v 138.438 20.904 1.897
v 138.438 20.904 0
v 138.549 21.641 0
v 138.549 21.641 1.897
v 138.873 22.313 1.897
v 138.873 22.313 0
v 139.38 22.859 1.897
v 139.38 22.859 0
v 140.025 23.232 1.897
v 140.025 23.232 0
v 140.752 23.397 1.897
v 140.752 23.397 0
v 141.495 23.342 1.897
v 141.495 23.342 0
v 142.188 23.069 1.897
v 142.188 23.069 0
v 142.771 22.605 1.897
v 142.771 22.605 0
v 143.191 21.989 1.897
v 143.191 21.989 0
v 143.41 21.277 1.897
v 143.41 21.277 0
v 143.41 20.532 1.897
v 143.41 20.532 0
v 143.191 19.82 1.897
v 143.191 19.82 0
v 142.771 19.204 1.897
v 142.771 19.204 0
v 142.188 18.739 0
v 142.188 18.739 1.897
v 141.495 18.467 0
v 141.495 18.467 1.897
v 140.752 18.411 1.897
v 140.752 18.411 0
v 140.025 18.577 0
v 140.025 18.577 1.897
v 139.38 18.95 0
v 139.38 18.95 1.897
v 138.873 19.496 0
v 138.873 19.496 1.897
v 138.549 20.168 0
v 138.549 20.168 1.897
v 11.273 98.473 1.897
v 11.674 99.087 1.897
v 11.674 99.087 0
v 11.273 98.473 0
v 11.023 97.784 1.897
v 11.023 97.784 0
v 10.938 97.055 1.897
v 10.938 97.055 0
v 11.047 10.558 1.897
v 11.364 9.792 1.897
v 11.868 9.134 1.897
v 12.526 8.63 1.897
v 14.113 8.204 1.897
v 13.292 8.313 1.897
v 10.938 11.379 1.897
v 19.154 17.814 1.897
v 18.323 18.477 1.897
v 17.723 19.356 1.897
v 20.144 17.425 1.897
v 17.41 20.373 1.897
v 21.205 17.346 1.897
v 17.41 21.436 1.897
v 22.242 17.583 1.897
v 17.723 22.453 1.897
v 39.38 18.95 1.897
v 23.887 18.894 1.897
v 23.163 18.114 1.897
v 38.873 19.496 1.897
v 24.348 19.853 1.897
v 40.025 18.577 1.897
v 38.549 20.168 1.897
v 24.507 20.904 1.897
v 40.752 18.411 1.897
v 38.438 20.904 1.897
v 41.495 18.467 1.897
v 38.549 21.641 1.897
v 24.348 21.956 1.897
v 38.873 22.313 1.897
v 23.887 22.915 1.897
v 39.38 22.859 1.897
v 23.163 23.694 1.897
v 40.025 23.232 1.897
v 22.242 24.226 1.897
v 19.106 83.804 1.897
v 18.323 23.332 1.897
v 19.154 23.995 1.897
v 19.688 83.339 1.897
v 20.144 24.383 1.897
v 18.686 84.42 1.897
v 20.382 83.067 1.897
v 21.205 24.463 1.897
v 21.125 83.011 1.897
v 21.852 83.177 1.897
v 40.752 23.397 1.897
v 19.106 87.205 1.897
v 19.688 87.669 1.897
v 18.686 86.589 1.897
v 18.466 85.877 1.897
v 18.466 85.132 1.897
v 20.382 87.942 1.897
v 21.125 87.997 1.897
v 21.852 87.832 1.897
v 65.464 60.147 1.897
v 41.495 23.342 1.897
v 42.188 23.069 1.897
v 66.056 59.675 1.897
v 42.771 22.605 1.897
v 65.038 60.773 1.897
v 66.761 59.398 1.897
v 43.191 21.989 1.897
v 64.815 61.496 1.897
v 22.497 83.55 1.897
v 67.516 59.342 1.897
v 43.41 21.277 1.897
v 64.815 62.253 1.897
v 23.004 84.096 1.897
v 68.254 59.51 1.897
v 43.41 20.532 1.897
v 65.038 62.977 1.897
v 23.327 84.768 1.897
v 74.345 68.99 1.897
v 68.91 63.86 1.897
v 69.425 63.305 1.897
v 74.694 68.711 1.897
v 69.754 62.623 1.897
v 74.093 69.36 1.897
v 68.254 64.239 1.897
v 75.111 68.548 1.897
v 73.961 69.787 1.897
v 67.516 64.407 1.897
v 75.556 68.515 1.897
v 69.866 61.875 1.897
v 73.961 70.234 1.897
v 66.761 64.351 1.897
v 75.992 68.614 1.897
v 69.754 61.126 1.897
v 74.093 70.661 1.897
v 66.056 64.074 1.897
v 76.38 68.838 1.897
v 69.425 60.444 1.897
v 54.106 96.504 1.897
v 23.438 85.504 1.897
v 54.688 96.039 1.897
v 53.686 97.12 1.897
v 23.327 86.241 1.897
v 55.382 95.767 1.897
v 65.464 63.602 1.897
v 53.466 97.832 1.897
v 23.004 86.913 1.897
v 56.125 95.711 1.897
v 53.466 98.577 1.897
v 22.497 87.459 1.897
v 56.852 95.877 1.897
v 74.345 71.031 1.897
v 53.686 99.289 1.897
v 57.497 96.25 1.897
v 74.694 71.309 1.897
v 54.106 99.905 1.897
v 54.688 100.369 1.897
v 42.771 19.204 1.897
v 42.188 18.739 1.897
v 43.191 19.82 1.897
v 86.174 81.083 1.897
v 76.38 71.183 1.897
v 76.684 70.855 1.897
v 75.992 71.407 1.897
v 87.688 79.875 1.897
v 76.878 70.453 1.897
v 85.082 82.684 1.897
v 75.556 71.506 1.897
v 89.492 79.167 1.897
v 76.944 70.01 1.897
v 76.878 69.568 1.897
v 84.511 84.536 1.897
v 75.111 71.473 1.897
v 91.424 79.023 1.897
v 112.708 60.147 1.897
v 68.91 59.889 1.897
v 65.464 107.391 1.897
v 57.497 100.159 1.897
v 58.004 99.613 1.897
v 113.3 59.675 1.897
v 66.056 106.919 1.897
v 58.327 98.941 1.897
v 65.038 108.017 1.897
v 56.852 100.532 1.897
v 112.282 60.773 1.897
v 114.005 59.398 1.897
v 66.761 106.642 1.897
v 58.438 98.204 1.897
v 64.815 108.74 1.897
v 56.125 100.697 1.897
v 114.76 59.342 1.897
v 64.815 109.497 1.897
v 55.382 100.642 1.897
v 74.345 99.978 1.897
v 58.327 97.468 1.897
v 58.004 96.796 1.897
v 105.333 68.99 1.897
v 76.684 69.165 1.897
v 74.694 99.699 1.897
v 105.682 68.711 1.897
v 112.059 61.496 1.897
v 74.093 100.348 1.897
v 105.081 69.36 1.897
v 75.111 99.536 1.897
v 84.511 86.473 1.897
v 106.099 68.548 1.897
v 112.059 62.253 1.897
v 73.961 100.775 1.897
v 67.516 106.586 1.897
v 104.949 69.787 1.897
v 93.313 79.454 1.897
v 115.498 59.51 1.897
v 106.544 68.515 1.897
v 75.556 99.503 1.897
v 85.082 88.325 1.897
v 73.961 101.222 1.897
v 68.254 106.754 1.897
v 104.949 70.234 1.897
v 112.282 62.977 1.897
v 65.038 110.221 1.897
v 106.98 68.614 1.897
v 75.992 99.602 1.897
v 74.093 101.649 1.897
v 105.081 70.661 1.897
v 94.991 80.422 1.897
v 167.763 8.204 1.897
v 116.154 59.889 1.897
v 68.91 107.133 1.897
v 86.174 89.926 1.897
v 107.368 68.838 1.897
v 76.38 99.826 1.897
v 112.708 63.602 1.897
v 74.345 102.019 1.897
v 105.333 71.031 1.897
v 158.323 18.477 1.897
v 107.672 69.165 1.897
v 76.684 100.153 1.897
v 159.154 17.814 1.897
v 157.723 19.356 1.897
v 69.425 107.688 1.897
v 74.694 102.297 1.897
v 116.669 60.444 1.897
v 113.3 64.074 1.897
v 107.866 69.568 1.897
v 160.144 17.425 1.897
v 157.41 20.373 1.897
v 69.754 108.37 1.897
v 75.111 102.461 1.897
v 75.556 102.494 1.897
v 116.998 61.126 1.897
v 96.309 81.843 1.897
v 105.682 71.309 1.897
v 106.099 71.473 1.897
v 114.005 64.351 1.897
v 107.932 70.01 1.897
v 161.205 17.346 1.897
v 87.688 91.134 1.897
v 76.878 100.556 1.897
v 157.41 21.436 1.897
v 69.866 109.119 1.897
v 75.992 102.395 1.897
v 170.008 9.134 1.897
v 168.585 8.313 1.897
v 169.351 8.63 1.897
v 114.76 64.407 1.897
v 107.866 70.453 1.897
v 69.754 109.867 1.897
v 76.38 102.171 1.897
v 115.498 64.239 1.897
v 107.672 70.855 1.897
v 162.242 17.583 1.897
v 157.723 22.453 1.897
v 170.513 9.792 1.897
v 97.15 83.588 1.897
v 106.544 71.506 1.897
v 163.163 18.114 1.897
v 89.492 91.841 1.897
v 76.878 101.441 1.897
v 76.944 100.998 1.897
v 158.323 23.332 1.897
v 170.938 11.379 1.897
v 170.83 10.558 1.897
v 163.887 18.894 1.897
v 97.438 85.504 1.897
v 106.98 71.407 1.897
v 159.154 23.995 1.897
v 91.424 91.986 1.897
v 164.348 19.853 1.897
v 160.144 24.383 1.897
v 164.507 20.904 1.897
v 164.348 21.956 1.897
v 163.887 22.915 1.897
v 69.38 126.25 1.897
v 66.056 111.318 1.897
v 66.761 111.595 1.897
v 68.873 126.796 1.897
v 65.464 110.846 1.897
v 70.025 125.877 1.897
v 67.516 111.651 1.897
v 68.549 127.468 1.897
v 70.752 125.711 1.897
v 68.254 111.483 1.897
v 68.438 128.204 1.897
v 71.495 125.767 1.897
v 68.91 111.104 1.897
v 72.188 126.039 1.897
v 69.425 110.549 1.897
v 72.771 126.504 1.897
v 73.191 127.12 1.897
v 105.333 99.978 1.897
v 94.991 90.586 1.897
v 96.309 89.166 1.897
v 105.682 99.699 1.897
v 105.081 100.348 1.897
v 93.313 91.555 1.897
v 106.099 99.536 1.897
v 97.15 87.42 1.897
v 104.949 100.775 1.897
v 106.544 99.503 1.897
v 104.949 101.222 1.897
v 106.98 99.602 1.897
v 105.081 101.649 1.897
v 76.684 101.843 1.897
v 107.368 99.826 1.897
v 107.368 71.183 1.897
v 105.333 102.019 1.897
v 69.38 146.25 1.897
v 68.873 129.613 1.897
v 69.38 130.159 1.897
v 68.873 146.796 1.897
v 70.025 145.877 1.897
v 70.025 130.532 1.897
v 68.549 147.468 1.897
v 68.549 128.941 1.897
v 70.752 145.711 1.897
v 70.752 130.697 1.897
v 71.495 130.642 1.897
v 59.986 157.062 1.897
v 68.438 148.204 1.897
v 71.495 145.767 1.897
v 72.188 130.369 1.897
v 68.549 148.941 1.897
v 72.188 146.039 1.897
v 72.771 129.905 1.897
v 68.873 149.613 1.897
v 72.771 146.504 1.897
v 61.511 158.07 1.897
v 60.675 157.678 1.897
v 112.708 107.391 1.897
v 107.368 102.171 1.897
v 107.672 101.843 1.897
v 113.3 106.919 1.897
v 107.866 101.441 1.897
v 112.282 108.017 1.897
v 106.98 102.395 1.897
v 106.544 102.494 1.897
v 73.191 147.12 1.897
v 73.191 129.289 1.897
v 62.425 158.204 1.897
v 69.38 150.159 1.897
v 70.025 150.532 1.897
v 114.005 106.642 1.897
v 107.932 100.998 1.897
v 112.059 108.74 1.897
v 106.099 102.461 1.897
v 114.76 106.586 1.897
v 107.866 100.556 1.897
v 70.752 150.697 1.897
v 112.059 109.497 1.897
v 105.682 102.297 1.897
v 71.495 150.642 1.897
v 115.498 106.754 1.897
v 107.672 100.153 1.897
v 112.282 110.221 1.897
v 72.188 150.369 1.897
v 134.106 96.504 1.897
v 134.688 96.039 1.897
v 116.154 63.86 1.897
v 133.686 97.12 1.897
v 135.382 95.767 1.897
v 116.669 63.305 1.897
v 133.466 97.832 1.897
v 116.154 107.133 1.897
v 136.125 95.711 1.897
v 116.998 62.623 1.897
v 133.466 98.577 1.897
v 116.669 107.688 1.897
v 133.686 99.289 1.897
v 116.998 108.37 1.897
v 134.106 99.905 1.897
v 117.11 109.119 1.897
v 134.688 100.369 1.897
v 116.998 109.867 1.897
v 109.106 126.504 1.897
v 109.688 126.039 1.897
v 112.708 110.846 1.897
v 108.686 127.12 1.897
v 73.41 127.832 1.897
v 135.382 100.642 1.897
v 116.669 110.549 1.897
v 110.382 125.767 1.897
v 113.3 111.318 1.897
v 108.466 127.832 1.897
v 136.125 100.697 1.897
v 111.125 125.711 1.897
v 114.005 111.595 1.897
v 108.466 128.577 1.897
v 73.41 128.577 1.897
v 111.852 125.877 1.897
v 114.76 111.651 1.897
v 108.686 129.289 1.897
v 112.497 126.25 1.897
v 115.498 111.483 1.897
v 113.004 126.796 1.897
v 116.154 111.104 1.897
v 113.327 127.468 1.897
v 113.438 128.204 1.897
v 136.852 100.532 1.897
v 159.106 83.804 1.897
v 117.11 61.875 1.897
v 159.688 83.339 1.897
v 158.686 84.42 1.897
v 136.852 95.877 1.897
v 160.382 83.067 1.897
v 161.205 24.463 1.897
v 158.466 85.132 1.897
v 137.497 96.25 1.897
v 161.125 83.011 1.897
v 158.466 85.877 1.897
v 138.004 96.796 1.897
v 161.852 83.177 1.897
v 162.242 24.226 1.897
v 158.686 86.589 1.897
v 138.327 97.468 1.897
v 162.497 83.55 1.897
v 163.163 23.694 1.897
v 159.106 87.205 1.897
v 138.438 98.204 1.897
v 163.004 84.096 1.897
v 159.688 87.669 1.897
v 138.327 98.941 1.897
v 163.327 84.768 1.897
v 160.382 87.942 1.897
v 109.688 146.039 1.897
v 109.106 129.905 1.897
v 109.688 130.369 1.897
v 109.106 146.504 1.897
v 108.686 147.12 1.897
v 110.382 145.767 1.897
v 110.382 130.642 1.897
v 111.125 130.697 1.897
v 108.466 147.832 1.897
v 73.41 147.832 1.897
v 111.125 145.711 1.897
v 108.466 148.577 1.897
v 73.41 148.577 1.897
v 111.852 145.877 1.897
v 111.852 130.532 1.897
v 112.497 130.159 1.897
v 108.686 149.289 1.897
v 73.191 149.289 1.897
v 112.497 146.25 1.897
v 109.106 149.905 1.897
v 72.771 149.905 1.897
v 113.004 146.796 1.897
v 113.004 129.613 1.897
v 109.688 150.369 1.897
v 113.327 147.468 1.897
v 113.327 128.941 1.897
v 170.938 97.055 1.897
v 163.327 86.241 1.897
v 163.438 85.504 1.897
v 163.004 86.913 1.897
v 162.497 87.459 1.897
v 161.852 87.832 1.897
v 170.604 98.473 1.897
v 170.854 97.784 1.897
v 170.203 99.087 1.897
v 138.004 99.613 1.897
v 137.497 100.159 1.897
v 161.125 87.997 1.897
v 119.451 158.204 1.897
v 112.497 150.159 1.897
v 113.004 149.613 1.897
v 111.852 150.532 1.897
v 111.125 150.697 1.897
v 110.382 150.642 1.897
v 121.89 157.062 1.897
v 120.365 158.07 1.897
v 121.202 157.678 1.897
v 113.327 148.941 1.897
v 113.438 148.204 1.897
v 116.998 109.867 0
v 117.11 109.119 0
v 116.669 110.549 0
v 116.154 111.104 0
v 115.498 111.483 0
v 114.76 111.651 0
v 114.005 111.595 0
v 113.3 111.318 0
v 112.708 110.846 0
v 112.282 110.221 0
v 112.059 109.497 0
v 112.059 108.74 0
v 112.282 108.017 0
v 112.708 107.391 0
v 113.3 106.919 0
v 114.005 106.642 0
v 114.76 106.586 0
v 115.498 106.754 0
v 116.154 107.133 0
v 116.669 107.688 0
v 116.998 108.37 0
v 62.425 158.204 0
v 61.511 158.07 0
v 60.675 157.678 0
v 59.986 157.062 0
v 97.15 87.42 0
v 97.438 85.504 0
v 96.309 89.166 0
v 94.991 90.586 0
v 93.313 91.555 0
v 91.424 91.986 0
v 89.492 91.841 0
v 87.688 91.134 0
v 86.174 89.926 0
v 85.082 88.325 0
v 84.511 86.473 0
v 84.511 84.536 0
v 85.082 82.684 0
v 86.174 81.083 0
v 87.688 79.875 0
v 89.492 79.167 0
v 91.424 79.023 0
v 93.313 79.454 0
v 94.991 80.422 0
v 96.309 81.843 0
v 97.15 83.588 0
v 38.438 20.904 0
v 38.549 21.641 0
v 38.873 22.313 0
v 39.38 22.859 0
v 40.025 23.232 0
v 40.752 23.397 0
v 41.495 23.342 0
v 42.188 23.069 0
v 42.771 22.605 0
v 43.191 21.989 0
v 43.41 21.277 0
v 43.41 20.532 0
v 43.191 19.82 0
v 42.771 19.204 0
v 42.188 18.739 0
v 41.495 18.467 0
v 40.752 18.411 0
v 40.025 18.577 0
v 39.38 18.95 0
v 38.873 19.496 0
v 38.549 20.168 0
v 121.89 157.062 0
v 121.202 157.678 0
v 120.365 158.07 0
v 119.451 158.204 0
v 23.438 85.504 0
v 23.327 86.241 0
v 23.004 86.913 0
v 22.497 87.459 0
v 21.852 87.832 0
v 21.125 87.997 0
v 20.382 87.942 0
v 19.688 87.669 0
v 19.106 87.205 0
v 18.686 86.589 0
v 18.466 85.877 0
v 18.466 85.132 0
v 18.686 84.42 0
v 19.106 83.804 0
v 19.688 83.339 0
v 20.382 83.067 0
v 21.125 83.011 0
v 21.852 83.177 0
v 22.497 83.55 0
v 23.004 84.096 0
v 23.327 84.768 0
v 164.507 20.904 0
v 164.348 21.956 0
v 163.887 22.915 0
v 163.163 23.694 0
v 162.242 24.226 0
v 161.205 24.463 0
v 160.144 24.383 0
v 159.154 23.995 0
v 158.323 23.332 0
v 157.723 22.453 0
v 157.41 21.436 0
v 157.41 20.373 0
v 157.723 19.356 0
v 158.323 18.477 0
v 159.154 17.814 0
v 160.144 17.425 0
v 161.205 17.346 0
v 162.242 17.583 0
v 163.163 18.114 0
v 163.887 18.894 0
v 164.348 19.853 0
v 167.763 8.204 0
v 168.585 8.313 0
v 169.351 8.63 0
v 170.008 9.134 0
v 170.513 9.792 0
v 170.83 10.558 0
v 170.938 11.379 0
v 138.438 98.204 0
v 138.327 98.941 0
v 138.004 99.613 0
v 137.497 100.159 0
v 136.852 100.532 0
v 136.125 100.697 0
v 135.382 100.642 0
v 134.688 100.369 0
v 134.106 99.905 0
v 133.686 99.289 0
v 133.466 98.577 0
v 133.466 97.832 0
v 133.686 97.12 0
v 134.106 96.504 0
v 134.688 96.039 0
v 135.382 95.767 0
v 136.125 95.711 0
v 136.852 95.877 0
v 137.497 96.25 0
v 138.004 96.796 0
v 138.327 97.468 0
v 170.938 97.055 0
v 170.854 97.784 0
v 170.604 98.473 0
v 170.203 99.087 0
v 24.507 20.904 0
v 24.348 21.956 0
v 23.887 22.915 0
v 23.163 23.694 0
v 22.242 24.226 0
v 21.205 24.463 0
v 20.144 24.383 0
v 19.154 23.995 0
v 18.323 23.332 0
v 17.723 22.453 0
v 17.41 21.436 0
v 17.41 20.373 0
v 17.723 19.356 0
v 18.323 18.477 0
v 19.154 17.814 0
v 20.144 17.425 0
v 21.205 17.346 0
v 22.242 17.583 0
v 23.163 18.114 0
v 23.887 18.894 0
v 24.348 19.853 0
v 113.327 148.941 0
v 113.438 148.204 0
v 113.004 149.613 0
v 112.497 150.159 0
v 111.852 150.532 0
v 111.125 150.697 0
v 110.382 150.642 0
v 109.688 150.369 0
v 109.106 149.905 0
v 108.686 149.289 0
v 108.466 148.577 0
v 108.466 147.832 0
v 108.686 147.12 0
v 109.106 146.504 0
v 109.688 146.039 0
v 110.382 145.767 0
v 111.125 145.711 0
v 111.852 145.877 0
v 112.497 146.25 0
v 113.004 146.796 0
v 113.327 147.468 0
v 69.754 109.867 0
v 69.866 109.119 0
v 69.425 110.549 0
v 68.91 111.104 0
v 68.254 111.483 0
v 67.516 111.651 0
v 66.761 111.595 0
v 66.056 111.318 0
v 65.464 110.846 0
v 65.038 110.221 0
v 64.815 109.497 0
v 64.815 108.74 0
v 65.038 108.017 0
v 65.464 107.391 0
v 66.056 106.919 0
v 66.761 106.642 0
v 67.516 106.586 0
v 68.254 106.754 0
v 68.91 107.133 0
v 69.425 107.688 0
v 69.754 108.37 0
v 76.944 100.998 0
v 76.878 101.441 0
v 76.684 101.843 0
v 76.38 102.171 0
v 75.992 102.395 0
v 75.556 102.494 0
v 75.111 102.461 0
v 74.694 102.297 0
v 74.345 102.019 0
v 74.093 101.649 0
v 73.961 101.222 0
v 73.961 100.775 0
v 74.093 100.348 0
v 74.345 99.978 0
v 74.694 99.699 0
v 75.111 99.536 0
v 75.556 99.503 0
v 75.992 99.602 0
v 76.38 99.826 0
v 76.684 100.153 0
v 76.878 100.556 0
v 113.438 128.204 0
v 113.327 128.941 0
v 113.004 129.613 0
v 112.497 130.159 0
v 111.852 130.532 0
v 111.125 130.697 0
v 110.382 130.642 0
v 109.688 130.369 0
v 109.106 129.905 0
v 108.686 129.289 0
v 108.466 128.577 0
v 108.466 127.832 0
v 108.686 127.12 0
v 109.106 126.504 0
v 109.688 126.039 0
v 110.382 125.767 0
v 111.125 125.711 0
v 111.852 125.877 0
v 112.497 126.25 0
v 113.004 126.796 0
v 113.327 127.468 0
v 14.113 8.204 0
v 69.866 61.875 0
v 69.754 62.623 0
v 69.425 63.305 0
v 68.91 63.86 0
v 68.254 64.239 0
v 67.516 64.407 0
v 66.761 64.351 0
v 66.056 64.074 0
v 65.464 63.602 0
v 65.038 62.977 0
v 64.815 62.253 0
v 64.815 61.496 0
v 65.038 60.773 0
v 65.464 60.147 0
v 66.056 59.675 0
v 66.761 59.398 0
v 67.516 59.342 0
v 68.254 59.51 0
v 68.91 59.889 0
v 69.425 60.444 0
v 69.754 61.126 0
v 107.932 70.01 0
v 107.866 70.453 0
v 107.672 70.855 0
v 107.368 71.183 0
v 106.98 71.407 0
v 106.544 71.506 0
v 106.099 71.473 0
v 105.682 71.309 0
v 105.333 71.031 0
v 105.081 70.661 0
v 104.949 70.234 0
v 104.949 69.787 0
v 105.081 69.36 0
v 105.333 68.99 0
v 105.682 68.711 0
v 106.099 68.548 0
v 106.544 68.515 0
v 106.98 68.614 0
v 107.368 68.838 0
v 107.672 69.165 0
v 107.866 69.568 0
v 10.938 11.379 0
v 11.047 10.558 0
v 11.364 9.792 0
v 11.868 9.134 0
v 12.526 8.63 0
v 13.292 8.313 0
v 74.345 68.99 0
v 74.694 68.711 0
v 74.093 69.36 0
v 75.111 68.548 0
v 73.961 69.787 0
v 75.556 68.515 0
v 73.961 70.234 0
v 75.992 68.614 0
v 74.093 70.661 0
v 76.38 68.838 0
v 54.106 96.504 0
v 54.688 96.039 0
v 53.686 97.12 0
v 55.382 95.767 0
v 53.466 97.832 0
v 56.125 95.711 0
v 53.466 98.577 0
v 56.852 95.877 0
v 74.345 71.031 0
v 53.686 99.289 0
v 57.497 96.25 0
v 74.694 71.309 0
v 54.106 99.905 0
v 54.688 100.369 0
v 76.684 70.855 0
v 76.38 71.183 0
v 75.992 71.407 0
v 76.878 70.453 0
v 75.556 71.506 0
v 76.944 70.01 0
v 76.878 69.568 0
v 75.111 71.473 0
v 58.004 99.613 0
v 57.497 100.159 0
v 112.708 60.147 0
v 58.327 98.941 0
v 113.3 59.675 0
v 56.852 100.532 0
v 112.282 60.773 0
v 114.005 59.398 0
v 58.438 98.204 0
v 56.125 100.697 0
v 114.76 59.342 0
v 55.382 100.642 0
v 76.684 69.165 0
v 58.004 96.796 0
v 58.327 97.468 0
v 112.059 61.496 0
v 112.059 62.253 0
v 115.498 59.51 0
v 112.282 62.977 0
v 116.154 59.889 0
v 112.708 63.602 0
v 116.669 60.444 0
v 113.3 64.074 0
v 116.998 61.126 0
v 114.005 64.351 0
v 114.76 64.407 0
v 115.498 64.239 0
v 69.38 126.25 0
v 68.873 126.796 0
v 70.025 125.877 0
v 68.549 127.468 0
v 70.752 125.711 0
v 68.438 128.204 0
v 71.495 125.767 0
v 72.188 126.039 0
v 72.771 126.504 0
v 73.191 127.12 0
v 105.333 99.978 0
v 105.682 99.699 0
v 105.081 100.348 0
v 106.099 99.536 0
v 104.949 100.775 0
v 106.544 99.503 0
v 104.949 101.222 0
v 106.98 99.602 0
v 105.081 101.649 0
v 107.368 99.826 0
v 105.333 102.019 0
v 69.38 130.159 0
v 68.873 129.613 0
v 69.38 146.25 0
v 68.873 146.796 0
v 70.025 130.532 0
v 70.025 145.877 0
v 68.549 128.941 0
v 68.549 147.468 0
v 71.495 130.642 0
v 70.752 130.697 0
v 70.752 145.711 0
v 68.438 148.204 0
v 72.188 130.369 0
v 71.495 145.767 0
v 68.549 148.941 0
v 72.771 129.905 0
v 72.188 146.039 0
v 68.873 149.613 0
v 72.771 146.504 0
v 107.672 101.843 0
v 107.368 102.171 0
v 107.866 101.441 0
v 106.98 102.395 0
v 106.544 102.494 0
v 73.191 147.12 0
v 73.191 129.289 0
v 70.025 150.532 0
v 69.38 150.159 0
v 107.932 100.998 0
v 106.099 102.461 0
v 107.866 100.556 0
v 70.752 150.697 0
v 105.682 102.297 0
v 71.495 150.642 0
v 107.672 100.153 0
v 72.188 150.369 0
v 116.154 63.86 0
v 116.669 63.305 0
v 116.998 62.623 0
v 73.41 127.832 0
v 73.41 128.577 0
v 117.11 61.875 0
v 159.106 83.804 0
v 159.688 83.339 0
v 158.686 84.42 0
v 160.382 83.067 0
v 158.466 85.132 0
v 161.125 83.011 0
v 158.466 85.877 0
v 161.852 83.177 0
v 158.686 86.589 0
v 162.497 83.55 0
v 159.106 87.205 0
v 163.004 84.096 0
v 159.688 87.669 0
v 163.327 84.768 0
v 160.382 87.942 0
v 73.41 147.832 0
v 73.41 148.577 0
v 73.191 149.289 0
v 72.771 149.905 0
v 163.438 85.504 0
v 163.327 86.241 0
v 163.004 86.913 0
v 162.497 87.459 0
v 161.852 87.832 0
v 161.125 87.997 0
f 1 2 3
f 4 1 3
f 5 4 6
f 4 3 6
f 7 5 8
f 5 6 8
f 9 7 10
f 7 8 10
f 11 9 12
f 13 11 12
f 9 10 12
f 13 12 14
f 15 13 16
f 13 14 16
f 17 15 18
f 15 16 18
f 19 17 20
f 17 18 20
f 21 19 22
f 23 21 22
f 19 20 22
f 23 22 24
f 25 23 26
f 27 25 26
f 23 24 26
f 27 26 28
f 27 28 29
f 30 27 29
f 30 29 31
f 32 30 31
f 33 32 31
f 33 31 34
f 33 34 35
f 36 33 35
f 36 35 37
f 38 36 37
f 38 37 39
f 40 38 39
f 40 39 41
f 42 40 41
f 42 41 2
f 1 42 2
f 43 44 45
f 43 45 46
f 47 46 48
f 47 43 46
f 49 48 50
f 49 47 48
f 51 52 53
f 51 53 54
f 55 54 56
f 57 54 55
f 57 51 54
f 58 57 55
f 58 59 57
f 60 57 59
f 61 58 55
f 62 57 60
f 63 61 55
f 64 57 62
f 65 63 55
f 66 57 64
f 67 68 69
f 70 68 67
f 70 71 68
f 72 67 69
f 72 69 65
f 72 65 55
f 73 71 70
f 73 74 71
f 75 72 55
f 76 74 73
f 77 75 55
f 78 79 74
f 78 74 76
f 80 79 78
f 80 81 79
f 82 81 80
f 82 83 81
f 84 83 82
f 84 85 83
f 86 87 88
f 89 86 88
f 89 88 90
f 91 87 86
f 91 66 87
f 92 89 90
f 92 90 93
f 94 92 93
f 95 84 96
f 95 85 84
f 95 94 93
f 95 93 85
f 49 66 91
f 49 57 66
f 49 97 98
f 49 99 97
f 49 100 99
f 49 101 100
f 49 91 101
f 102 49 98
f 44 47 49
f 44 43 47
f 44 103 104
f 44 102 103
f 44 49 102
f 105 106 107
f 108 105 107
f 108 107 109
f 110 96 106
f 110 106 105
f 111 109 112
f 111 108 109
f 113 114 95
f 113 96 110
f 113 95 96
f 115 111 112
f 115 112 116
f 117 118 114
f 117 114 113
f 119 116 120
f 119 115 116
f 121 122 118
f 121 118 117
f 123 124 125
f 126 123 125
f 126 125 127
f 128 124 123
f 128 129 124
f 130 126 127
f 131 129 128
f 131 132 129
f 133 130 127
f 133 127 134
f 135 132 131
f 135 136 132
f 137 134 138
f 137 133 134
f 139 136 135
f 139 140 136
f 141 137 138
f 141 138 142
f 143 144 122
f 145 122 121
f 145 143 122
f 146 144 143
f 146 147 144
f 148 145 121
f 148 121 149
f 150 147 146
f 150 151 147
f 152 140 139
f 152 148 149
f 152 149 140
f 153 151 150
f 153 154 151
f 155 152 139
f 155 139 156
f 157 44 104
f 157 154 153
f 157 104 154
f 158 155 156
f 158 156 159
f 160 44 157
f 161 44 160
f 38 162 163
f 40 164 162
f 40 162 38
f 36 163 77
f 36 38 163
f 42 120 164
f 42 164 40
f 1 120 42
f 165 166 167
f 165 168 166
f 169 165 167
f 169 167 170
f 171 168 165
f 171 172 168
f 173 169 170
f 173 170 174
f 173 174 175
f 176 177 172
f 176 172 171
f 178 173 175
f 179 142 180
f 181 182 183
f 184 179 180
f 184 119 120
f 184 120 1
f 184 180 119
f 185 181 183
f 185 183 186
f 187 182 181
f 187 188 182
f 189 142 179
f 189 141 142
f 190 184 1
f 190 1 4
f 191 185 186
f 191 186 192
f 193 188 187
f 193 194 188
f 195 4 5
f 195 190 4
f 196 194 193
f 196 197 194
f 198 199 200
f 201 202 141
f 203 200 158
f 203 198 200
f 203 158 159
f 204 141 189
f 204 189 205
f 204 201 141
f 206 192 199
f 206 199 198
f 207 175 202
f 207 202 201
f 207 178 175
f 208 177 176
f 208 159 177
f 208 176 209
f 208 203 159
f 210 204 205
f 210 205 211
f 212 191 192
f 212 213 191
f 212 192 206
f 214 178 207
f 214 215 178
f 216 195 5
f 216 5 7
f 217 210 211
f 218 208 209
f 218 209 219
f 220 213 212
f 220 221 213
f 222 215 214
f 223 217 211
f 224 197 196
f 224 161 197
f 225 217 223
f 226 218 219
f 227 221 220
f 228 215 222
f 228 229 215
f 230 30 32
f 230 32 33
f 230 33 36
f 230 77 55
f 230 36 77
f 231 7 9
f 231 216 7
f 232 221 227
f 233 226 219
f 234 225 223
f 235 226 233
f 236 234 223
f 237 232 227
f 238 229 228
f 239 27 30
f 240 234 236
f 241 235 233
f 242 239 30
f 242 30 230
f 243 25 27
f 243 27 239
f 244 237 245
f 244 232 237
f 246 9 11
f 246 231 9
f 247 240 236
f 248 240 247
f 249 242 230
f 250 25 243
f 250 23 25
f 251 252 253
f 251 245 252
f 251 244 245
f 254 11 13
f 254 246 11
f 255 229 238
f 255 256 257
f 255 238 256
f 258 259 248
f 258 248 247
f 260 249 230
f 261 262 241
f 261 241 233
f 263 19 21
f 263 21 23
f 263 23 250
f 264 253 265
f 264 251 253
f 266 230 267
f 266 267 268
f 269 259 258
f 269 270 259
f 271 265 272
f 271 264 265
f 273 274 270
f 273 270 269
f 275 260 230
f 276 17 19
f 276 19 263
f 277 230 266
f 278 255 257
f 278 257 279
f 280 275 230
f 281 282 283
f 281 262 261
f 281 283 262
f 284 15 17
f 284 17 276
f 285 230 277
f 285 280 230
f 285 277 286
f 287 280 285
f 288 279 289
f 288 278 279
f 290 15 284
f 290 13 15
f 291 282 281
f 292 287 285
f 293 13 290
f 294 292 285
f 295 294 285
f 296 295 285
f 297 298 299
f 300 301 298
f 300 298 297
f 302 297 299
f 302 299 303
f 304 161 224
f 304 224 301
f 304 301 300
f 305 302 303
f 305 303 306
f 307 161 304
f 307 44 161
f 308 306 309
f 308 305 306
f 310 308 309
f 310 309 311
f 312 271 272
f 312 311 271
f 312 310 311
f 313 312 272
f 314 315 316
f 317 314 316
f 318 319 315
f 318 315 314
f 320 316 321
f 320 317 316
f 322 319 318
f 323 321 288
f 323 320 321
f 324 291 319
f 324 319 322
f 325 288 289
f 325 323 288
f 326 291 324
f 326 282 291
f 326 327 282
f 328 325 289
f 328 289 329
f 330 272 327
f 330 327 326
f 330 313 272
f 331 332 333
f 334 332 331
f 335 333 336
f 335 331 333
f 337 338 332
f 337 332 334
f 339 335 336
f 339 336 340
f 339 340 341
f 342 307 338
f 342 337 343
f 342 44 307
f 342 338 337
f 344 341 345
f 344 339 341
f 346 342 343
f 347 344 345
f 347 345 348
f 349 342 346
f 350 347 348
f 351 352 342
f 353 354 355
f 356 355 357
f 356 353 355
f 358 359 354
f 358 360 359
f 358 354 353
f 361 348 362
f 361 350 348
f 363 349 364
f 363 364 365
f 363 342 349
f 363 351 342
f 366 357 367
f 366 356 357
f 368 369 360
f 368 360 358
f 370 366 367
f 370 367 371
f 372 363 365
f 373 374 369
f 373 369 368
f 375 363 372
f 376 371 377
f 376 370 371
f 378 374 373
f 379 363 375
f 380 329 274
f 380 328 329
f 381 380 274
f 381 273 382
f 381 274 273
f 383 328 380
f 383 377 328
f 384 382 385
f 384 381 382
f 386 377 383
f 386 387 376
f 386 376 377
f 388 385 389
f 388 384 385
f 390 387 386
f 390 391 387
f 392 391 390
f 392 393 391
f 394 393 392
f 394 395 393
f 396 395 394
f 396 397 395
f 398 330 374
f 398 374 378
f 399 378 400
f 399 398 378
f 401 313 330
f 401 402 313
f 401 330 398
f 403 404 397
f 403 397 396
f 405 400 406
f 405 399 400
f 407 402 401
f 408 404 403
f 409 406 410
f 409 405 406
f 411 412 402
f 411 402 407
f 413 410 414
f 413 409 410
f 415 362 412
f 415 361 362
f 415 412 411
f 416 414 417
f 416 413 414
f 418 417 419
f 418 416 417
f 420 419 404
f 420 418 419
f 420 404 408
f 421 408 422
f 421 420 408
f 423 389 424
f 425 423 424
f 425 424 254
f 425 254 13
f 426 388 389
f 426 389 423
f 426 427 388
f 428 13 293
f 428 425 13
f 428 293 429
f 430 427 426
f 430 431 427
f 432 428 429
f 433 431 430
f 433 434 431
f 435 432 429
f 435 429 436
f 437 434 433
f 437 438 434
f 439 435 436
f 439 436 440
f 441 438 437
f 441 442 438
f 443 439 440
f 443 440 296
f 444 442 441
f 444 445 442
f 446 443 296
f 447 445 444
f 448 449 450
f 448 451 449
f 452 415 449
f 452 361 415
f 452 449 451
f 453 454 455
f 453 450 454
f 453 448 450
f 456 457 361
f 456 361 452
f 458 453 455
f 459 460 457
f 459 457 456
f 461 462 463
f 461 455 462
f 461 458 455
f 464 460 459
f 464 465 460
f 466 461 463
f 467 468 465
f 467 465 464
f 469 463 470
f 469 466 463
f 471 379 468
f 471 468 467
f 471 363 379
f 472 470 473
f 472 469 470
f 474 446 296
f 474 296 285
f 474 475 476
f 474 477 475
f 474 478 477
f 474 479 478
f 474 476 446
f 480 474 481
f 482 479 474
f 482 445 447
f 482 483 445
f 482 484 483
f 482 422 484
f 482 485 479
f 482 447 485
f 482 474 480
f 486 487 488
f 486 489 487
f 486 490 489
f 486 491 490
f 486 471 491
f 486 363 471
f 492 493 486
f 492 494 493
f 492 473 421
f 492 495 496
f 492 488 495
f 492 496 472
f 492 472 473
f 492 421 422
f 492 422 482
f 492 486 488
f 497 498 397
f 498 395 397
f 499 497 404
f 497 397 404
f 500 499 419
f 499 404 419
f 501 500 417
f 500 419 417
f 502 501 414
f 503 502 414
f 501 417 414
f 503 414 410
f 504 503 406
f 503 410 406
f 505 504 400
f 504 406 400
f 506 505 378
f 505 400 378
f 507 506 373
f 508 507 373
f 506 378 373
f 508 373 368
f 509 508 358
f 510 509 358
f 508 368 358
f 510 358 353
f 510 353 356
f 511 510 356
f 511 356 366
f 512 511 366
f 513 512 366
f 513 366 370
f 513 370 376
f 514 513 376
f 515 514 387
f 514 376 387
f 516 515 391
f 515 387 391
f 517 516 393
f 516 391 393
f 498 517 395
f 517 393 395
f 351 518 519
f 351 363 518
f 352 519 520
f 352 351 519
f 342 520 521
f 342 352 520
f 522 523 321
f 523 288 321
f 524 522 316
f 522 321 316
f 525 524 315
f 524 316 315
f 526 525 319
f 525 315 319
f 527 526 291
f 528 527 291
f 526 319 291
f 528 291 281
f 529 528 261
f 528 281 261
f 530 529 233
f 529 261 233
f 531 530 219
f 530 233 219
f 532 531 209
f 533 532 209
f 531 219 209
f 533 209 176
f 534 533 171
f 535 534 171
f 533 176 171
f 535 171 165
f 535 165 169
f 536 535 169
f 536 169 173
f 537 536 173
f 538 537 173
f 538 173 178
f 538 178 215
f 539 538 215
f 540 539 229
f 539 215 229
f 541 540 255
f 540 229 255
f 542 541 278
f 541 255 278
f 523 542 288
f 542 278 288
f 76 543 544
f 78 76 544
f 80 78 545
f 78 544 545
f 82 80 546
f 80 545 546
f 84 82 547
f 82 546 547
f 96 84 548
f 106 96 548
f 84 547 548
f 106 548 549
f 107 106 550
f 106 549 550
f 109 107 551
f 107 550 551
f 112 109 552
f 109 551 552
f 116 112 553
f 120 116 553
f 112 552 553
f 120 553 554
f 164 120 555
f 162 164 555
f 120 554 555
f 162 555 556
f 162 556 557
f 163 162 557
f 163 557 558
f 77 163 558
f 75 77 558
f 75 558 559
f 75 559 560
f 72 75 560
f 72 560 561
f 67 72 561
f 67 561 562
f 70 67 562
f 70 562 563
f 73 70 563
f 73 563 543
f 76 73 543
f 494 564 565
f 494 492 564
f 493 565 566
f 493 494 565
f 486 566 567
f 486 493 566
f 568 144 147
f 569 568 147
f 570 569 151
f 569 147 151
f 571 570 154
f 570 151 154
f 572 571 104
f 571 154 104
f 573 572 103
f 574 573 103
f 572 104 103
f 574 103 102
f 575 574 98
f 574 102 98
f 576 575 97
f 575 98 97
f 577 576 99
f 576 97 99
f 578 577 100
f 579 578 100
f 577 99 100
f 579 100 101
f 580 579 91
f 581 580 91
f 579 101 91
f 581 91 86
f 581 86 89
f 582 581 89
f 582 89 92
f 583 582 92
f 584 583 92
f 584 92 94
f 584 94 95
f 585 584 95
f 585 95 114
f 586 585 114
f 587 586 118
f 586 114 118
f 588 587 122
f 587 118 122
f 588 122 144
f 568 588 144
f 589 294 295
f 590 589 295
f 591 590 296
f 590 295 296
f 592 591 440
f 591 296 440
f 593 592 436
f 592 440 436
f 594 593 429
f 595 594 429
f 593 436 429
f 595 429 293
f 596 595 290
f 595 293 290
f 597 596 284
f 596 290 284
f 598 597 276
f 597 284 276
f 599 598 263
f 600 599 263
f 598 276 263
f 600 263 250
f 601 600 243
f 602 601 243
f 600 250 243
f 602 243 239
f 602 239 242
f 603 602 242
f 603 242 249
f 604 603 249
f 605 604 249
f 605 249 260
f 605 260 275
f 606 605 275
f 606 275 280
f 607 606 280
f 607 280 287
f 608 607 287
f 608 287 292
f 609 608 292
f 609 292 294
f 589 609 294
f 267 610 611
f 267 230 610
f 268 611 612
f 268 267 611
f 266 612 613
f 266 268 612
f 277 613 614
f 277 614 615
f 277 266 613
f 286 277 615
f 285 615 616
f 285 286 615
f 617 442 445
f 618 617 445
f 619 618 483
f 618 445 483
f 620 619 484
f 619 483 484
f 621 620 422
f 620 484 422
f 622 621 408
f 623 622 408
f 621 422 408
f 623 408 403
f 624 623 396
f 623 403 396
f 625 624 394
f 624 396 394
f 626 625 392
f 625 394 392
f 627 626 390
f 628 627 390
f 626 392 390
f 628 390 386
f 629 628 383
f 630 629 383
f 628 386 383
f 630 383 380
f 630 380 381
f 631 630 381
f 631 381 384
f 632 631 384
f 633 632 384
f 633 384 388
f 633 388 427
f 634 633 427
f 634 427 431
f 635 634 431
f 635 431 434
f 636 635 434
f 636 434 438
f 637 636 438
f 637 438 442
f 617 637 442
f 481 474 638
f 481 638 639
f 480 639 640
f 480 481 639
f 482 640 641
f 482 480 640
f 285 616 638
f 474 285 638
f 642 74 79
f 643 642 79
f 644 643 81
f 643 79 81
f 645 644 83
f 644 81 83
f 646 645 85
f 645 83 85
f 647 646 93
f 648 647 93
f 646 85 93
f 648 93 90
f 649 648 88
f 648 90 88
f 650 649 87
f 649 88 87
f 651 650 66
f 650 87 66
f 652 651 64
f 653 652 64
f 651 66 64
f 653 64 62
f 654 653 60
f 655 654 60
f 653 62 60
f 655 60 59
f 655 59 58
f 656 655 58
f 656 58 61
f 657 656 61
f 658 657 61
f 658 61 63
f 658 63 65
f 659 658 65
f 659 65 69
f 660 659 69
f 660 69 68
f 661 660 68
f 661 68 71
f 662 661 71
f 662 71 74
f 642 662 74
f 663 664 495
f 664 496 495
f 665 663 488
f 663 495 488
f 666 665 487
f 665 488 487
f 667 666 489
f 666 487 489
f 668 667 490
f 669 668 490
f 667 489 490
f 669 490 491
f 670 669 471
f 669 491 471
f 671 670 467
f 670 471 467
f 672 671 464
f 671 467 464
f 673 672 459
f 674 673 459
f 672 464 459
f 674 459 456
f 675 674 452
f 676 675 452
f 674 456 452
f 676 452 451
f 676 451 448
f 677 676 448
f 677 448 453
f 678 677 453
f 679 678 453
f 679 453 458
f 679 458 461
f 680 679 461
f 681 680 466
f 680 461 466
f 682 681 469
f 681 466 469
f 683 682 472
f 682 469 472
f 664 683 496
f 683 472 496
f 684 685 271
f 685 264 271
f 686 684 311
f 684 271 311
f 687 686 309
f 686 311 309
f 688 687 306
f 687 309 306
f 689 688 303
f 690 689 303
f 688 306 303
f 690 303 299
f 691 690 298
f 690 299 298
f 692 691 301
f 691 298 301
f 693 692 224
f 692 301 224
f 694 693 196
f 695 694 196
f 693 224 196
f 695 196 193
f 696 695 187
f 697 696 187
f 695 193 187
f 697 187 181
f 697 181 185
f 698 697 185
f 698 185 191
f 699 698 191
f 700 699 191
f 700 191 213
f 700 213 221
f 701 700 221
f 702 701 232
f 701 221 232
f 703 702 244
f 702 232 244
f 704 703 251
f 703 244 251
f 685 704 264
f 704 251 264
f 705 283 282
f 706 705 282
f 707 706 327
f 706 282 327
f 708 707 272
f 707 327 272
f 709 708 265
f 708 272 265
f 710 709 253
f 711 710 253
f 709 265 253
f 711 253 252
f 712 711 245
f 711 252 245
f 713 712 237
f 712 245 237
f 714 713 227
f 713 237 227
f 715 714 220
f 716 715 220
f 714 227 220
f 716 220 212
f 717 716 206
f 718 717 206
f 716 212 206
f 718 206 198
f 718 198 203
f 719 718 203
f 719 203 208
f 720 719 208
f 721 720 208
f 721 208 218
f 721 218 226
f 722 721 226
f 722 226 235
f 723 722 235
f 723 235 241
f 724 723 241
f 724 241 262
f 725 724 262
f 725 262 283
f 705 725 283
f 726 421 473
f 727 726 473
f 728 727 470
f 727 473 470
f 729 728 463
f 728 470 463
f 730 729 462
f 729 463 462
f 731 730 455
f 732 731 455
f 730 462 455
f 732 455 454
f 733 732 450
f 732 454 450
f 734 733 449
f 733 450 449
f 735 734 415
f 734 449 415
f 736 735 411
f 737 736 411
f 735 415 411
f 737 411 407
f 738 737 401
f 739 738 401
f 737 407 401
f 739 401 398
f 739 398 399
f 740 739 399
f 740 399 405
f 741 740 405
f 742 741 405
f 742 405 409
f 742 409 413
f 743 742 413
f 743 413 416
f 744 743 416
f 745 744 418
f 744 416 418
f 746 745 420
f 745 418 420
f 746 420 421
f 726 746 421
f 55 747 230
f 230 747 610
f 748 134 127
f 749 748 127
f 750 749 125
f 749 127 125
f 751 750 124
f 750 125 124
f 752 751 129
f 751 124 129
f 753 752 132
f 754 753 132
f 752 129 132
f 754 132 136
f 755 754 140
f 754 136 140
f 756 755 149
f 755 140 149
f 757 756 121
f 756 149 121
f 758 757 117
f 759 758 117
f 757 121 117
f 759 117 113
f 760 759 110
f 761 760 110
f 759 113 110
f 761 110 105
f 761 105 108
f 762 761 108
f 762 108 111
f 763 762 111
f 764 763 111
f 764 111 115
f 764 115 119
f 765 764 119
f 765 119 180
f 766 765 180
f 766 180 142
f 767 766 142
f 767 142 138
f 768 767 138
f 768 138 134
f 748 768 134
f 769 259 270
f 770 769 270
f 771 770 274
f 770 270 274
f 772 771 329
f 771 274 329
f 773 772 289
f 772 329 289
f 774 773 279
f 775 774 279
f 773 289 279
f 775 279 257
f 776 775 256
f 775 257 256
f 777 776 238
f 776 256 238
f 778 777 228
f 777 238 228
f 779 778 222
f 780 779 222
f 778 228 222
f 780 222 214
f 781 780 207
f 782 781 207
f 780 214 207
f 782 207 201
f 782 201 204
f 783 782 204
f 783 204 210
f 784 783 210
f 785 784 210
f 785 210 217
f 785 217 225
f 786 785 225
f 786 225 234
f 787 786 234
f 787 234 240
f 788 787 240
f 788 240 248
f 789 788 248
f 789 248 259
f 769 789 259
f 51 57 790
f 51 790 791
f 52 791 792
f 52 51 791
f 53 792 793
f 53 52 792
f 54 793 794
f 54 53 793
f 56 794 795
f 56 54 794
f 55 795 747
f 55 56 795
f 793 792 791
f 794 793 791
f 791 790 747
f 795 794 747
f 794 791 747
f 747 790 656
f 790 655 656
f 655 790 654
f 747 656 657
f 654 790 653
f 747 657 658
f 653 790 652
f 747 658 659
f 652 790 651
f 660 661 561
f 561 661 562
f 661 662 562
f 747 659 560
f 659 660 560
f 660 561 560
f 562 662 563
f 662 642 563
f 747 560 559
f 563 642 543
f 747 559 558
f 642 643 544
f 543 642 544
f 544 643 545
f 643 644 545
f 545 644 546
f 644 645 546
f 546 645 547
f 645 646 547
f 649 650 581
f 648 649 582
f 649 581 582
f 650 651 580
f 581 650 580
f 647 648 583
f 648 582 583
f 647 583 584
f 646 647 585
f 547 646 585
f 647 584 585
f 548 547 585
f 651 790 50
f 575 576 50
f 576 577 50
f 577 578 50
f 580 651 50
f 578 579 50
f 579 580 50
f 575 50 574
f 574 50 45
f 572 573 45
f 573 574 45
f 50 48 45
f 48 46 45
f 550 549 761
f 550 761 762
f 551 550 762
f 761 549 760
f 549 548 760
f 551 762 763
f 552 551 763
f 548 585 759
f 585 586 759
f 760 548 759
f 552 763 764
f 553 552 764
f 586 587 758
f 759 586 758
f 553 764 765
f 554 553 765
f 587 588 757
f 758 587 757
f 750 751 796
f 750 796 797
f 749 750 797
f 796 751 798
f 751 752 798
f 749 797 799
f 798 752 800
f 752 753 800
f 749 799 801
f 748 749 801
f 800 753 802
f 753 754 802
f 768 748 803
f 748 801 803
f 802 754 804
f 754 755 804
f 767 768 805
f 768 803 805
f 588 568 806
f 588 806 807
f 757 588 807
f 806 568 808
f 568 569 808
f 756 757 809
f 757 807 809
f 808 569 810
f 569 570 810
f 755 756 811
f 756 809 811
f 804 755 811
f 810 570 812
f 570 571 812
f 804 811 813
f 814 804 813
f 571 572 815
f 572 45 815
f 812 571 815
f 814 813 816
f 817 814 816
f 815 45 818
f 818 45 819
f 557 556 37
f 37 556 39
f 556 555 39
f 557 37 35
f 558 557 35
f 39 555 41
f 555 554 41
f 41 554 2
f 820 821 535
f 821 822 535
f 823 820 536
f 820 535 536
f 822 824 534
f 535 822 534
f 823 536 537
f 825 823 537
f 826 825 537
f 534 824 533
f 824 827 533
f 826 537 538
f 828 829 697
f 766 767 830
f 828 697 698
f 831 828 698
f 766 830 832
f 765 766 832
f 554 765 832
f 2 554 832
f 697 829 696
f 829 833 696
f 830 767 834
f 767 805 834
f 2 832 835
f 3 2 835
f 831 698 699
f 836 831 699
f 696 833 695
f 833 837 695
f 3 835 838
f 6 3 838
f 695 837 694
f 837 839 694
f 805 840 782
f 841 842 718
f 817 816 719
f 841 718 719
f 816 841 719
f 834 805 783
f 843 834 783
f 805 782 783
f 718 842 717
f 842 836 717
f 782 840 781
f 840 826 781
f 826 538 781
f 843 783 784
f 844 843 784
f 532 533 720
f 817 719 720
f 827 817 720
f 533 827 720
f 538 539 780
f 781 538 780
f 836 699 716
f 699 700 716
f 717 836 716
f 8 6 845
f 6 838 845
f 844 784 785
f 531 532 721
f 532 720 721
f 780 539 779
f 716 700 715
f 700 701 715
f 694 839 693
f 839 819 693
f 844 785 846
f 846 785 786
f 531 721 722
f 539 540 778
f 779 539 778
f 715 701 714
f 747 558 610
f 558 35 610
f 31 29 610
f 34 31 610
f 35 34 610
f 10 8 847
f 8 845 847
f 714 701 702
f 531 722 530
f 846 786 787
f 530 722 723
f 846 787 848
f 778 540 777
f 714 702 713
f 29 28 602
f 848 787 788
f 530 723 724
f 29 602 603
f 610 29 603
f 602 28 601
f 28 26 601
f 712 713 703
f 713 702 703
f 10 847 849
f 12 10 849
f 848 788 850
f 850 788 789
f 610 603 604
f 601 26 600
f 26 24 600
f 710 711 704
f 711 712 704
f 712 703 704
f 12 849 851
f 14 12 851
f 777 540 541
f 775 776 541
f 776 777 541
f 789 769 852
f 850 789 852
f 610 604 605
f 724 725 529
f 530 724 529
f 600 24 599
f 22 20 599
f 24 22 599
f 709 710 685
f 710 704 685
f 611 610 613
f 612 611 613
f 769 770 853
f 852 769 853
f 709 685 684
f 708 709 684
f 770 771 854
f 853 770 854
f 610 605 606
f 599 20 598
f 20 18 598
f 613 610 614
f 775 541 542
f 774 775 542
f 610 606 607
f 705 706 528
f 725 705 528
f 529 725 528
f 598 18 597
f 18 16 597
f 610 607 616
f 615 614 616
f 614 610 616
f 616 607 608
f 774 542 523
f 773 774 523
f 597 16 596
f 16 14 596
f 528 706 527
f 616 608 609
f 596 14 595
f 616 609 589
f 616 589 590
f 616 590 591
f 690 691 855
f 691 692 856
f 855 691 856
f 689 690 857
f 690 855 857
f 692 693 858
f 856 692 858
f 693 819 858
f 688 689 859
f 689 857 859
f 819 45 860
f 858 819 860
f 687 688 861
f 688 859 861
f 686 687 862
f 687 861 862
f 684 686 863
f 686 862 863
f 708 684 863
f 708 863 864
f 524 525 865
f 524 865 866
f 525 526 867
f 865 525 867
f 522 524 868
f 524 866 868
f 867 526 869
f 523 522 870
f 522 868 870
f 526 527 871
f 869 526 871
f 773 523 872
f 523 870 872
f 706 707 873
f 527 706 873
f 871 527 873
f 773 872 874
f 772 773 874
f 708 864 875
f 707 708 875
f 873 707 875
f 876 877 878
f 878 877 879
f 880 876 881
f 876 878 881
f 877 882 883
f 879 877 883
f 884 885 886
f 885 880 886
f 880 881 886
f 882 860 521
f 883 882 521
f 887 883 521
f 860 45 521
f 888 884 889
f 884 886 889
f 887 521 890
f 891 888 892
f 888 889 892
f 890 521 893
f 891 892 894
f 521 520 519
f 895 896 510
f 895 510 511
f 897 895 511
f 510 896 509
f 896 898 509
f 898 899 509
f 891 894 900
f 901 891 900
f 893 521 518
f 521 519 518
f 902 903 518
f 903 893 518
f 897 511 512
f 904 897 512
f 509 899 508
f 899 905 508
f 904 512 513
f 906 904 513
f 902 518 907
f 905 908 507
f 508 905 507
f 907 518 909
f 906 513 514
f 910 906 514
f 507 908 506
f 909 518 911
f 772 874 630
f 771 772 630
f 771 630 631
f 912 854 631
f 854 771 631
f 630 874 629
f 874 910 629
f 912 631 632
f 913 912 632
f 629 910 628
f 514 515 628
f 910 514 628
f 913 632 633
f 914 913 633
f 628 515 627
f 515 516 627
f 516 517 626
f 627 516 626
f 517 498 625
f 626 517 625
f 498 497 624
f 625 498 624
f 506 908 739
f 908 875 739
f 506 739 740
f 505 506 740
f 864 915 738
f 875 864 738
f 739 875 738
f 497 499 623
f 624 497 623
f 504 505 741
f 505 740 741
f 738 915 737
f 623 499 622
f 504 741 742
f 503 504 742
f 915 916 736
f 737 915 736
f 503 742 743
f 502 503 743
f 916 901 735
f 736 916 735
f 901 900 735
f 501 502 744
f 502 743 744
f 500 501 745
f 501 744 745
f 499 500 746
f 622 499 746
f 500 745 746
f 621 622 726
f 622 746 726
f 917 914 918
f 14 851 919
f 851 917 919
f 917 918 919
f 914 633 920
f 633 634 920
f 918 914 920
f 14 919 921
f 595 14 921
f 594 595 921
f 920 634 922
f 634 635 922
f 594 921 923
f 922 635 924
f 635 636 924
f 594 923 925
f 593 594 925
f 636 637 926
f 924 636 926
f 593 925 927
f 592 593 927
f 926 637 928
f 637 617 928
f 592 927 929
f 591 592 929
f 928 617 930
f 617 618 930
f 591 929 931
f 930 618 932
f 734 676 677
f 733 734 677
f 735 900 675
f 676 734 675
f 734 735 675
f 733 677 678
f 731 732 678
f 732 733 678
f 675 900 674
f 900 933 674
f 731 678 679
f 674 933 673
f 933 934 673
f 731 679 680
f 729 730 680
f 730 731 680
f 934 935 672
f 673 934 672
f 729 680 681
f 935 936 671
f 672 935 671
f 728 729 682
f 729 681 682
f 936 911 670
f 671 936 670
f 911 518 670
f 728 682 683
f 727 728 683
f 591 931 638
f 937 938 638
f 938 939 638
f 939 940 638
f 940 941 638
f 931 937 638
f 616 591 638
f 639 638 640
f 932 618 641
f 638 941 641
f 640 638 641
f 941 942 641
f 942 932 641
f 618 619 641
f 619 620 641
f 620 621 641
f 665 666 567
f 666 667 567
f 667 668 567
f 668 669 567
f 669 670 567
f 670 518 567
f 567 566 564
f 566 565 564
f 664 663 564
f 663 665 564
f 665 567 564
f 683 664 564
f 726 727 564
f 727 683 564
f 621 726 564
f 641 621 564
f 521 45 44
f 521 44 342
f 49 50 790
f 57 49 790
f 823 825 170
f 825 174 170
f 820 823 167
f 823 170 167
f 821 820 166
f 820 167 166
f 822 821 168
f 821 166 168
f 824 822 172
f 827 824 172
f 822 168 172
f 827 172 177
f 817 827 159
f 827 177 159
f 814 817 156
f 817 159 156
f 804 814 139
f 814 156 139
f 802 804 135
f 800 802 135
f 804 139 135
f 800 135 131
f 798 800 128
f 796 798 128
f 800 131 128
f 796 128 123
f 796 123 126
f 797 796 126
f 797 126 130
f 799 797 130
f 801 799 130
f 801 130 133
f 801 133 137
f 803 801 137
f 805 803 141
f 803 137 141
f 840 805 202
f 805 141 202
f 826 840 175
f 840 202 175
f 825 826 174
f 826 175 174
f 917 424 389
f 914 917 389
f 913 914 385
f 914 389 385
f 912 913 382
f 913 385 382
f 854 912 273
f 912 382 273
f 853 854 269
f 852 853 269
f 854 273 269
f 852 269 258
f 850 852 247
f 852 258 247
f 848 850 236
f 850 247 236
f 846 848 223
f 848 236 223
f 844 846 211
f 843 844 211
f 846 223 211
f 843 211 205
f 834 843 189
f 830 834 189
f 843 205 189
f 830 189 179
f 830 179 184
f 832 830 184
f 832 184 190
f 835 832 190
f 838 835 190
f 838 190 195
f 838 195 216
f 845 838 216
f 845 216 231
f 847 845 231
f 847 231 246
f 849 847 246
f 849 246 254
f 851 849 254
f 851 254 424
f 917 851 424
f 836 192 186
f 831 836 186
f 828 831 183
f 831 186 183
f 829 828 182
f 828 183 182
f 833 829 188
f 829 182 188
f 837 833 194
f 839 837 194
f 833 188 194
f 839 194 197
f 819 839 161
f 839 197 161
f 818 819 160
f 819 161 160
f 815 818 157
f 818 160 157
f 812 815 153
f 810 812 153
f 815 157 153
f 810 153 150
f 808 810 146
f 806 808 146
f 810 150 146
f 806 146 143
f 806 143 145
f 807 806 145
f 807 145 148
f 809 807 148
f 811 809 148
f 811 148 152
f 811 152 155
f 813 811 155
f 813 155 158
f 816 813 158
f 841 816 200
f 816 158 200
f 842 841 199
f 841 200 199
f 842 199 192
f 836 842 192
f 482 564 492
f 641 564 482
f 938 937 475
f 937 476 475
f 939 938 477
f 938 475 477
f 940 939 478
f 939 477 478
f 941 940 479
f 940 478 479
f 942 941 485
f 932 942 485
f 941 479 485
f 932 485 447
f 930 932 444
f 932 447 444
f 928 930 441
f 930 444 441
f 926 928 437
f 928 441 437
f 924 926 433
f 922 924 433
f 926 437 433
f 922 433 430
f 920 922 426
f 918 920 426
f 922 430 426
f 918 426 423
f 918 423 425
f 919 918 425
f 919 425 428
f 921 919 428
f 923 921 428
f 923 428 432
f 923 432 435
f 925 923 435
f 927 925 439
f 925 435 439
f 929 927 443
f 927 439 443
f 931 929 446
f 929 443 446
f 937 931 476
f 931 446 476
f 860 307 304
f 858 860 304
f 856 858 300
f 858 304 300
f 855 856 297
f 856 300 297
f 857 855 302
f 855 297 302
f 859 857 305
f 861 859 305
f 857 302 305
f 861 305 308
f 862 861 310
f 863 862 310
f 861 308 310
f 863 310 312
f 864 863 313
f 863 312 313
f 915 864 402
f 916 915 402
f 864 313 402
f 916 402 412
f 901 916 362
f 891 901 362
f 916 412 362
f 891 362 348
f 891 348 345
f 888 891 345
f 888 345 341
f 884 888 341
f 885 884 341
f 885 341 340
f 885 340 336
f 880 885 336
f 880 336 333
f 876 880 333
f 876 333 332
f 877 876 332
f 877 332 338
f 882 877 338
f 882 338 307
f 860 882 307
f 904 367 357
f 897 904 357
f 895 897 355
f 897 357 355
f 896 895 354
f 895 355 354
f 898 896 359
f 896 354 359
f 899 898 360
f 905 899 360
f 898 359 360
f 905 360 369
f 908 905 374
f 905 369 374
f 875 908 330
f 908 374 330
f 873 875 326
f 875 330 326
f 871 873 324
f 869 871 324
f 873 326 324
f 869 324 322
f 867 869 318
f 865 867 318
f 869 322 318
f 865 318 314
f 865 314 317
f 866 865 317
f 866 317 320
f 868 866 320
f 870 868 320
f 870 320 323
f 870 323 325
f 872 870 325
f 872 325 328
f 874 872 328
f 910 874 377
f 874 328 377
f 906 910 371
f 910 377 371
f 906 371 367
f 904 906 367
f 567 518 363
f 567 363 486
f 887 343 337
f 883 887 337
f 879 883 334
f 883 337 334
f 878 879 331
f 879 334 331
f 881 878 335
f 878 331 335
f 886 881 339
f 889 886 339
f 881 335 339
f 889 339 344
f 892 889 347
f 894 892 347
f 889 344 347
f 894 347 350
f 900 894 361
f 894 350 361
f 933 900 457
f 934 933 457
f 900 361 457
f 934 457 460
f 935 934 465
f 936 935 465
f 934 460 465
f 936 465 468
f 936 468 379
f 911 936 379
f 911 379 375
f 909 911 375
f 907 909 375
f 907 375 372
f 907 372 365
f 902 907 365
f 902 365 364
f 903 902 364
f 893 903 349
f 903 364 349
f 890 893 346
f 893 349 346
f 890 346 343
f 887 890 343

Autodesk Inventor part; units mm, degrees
ref_plane "YZ Plane" through (0, 0, 0) normal (1, 0, 0) x (0, 1, 0)
ref_plane "XZ Plane" through (0, 0, 0) normal (0, 1, 0) x (-1, 0, 0)
ref_plane "XY Plane" through (0, 0, 0) normal (0, 0, 1) x (1, 0, 0)
sketch "Sketch1" plane through (0, 0, 0) normal (0, 0, 1) x (1, 0, 0)
  line L0 (10.9384, 8.2044) -> (170.9384, 8.2044)
  line L1 (170.9384, 8.2044) -> (170.9384, 98.2044)
  line L2 (10.9384, 98.2044) -> (10.9384, 8.2044)
  line L3 (10.9384, 98.2044) -> (60.9384, 158.2044)
  line L4 (60.9384, 158.2044) -> (120.9384, 158.2044)
  line L5 (120.9384, 158.2044) -> (170.9384, 98.2044)
  dimension "d0" = 160
  dimension "d4" = 60
  dimension "d5" = 50
  dimension "d6" = 90
  dimension "d7" = 90
  dimension "d8" = 150
extrude "Extrusion1" add sketch "Sketch1" along normal blind 1.8974
sketch "Sketch2" plane through (0, 0, 1.8974) normal (0, 0, 1) x (1, 0, 0)
  line L0 (10.9384, 8.2044) -> (10.9384, 98.2044) projected
  line L1 (170.9384, 8.2044) -> (10.9384, 8.2044) projected
  circle A0 centre (20.9384, 20.9044) radius 3.5685
  circle A1 centre (20.9384, 85.5044) radius 2.5
  dimension "d11" = 7.137
  dimension "d12" = 12.7
  dimension "d13" = 10
  dimension "d14" = 10
  dimension "d15" = 64.6
  dimension "d16" = 5
extrude "Extrusion2" cut sketch "Sketch2" against normal through all
pattern_linear "Rectangular Pattern1" count 2 spacing 140 along (1, 0, 0) of "Extrusion2"
sketch "Sketch3" plane through (0, 0, 1.8974) normal (0, 0, 1) x (1, 0, 0)
  line L0 (10.9384, 8.2044) -> (10.9384, 98.2044) projected
  line L1 (170.9384, 8.2044) -> (10.9384, 8.2044) projected
  circle A0 centre (90.9384, 85.5044) radius 6.5
  circle A1 centre (75.4444, 70.0104) radius 1.5
  circle A2 centre (106.4324, 70.0104) radius 1.5
  circle A3 centre (75.4444, 100.9984) radius 1.5
  circle A4 centre (106.4324, 100.9984) radius 1.5
  dimension "d22" = 13
  dimension "d23" = 80
  dimension "d24" = 77.3
  dimension "d27" = 3
  dimension "d28" = 61.806
  dimension "d29" = 64.506
  dimension "d30" = 3
  dimension "d31" = 61.806
  dimension "d32" = 95.494
  dimension "d33" = 3
  dimension "d34" = 3
  dimension "d35" = 64.506
  dimension "d36" = 92.794
  dimension "d37" = 92.794
  dimension "d38" = 95.494
extrude "Extrusion3" cut sketch "Sketch3" against normal through all
sketch "Sketch4" plane through (0, 0, 1.8974) normal (0, 0, 1) x (1, 0, 0)
  circle A0 centre (160.9384, 85.5044) radius 2.5 projected
  circle A1 centre (20.9384, 85.5044) radius 2.5 projected
  line L0 (10.9384, 8.2044) -> (10.9384, 98.2044) projected
  line L1 (170.9384, 98.2044) -> (170.9384, 8.2044) projected
  circle A2 centre (55.9384, 98.2044) radius 2.5
  circle A3 centre (135.9384, 98.2044) radius 2.5
  dimension "d39" = 45
  dimension "d40" = 12.7
  dimension "d41" = 5
  dimension "d42" = 35
  dimension "d43" = 12.7
  dimension "d44" = 5
extrude "Extrusion4" cut sketch "Sketch4" against normal through all contours A2 | A3
sketch "Sketch5" plane through (0, 0, 1.8974) normal (0, 0, 1) x (1, 0, 0)
  line L0 (60.9384, 158.2044) -> (120.9384, 158.2044) projected
  circle A0 centre (110.9384, 148.2044) radius 2.5
  circle A1 centre (110.9384, 128.2044) radius 2.5
  dimension "d47" = 10
  dimension "d48" = 10
  dimension "d49" = 20
  dimension "d50" = 10
  dimension "d51" = 5
  dimension "d52" = 5
extrude "Extrusion5" cut sketch "Sketch5" against normal through all
sketch "Sketch6" plane through (0, 0, 1.8974) normal (0, 0, 1) x (1, 0, 0)
  line L0 (10.9384, 8.2044) -> (10.9384, 98.2044) projected
  line L1 (170.9384, 8.2044) -> (10.9384, 8.2044) projected
  circle A0 centre (67.3264, 61.8746) radius 2.54
  dimension "d55" = 56.388
  dimension "d56" = 53.6702
  dimension "d57" = 5.08
extrude "Extrusion6" cut sketch "Sketch6" against normal through all
pattern_linear "Rectangular Pattern2" count 2 spacing 47.244 along (1, 0, 0) count 2 spacing 47.244 along (0, 1, 0) of "Extrusion6"
fillet "Fillet2" radius 3.175 6 edges at (120.9384, 158.2044, 0.9487) (60.9384, 158.2044, 0.9487) (170.9384, 98.2044, 0.9487) (170.9384, 8.2044, 0.9487) (10.9384, 98.2044, 0.9487) (10.9384, 8.2044, 0.9487)
sketch "Sketch7" plane through (0, 0, 0) normal (0, 0, -1) x (-1, 0, 0)
  line L0 (-10.9384, 97.0549) -> (-10.9384, 11.3794) projected
  line L1 (-170.9384, 11.3794) -> (-170.9384, 97.0549) projected
  line L2 (-14.1134, 8.2044) -> (-167.7634, 8.2044) projected
  circle A0 centre (-140.9384, 20.9044) radius 2.5
  circle A1 centre (-40.9384, 20.9044) radius 2.5
  dimension "d68" = 5
  dimension "d69" = 12.7
  dimension "d70" = 30
  dimension "d71" = 5
  dimension "d72" = 30
  dimension "d73" = 12.7
extrude "Extrusion7" cut sketch "Sketch7" against normal through all
ref_plane "Work Plane1" through (90.9384, 158.2044, 1.8974) normal (0, 0, 1) x (1, 0, 0)
ref_plane "Work Plane2" through (90.9384, 158.2044, 1.8974) normal (-1, 0, 0) x (0, 0, 1)
mirror "Mirror1" about plane through (90.9384, 158.2044, 1.8974) normal (-1, 0, 0) of "Extrusion5"
equation "\"d7\" = d6"
equation "\"d30\" = d27"
equation "\"d31\" = d28"
equation "\"d33\" = d27"
equation "\"d34\" = d27"
equation "\"d35\" = d29"
equation "\"d50\" = d48"
properties part number "SM-S01" material "Steel, Mild"
